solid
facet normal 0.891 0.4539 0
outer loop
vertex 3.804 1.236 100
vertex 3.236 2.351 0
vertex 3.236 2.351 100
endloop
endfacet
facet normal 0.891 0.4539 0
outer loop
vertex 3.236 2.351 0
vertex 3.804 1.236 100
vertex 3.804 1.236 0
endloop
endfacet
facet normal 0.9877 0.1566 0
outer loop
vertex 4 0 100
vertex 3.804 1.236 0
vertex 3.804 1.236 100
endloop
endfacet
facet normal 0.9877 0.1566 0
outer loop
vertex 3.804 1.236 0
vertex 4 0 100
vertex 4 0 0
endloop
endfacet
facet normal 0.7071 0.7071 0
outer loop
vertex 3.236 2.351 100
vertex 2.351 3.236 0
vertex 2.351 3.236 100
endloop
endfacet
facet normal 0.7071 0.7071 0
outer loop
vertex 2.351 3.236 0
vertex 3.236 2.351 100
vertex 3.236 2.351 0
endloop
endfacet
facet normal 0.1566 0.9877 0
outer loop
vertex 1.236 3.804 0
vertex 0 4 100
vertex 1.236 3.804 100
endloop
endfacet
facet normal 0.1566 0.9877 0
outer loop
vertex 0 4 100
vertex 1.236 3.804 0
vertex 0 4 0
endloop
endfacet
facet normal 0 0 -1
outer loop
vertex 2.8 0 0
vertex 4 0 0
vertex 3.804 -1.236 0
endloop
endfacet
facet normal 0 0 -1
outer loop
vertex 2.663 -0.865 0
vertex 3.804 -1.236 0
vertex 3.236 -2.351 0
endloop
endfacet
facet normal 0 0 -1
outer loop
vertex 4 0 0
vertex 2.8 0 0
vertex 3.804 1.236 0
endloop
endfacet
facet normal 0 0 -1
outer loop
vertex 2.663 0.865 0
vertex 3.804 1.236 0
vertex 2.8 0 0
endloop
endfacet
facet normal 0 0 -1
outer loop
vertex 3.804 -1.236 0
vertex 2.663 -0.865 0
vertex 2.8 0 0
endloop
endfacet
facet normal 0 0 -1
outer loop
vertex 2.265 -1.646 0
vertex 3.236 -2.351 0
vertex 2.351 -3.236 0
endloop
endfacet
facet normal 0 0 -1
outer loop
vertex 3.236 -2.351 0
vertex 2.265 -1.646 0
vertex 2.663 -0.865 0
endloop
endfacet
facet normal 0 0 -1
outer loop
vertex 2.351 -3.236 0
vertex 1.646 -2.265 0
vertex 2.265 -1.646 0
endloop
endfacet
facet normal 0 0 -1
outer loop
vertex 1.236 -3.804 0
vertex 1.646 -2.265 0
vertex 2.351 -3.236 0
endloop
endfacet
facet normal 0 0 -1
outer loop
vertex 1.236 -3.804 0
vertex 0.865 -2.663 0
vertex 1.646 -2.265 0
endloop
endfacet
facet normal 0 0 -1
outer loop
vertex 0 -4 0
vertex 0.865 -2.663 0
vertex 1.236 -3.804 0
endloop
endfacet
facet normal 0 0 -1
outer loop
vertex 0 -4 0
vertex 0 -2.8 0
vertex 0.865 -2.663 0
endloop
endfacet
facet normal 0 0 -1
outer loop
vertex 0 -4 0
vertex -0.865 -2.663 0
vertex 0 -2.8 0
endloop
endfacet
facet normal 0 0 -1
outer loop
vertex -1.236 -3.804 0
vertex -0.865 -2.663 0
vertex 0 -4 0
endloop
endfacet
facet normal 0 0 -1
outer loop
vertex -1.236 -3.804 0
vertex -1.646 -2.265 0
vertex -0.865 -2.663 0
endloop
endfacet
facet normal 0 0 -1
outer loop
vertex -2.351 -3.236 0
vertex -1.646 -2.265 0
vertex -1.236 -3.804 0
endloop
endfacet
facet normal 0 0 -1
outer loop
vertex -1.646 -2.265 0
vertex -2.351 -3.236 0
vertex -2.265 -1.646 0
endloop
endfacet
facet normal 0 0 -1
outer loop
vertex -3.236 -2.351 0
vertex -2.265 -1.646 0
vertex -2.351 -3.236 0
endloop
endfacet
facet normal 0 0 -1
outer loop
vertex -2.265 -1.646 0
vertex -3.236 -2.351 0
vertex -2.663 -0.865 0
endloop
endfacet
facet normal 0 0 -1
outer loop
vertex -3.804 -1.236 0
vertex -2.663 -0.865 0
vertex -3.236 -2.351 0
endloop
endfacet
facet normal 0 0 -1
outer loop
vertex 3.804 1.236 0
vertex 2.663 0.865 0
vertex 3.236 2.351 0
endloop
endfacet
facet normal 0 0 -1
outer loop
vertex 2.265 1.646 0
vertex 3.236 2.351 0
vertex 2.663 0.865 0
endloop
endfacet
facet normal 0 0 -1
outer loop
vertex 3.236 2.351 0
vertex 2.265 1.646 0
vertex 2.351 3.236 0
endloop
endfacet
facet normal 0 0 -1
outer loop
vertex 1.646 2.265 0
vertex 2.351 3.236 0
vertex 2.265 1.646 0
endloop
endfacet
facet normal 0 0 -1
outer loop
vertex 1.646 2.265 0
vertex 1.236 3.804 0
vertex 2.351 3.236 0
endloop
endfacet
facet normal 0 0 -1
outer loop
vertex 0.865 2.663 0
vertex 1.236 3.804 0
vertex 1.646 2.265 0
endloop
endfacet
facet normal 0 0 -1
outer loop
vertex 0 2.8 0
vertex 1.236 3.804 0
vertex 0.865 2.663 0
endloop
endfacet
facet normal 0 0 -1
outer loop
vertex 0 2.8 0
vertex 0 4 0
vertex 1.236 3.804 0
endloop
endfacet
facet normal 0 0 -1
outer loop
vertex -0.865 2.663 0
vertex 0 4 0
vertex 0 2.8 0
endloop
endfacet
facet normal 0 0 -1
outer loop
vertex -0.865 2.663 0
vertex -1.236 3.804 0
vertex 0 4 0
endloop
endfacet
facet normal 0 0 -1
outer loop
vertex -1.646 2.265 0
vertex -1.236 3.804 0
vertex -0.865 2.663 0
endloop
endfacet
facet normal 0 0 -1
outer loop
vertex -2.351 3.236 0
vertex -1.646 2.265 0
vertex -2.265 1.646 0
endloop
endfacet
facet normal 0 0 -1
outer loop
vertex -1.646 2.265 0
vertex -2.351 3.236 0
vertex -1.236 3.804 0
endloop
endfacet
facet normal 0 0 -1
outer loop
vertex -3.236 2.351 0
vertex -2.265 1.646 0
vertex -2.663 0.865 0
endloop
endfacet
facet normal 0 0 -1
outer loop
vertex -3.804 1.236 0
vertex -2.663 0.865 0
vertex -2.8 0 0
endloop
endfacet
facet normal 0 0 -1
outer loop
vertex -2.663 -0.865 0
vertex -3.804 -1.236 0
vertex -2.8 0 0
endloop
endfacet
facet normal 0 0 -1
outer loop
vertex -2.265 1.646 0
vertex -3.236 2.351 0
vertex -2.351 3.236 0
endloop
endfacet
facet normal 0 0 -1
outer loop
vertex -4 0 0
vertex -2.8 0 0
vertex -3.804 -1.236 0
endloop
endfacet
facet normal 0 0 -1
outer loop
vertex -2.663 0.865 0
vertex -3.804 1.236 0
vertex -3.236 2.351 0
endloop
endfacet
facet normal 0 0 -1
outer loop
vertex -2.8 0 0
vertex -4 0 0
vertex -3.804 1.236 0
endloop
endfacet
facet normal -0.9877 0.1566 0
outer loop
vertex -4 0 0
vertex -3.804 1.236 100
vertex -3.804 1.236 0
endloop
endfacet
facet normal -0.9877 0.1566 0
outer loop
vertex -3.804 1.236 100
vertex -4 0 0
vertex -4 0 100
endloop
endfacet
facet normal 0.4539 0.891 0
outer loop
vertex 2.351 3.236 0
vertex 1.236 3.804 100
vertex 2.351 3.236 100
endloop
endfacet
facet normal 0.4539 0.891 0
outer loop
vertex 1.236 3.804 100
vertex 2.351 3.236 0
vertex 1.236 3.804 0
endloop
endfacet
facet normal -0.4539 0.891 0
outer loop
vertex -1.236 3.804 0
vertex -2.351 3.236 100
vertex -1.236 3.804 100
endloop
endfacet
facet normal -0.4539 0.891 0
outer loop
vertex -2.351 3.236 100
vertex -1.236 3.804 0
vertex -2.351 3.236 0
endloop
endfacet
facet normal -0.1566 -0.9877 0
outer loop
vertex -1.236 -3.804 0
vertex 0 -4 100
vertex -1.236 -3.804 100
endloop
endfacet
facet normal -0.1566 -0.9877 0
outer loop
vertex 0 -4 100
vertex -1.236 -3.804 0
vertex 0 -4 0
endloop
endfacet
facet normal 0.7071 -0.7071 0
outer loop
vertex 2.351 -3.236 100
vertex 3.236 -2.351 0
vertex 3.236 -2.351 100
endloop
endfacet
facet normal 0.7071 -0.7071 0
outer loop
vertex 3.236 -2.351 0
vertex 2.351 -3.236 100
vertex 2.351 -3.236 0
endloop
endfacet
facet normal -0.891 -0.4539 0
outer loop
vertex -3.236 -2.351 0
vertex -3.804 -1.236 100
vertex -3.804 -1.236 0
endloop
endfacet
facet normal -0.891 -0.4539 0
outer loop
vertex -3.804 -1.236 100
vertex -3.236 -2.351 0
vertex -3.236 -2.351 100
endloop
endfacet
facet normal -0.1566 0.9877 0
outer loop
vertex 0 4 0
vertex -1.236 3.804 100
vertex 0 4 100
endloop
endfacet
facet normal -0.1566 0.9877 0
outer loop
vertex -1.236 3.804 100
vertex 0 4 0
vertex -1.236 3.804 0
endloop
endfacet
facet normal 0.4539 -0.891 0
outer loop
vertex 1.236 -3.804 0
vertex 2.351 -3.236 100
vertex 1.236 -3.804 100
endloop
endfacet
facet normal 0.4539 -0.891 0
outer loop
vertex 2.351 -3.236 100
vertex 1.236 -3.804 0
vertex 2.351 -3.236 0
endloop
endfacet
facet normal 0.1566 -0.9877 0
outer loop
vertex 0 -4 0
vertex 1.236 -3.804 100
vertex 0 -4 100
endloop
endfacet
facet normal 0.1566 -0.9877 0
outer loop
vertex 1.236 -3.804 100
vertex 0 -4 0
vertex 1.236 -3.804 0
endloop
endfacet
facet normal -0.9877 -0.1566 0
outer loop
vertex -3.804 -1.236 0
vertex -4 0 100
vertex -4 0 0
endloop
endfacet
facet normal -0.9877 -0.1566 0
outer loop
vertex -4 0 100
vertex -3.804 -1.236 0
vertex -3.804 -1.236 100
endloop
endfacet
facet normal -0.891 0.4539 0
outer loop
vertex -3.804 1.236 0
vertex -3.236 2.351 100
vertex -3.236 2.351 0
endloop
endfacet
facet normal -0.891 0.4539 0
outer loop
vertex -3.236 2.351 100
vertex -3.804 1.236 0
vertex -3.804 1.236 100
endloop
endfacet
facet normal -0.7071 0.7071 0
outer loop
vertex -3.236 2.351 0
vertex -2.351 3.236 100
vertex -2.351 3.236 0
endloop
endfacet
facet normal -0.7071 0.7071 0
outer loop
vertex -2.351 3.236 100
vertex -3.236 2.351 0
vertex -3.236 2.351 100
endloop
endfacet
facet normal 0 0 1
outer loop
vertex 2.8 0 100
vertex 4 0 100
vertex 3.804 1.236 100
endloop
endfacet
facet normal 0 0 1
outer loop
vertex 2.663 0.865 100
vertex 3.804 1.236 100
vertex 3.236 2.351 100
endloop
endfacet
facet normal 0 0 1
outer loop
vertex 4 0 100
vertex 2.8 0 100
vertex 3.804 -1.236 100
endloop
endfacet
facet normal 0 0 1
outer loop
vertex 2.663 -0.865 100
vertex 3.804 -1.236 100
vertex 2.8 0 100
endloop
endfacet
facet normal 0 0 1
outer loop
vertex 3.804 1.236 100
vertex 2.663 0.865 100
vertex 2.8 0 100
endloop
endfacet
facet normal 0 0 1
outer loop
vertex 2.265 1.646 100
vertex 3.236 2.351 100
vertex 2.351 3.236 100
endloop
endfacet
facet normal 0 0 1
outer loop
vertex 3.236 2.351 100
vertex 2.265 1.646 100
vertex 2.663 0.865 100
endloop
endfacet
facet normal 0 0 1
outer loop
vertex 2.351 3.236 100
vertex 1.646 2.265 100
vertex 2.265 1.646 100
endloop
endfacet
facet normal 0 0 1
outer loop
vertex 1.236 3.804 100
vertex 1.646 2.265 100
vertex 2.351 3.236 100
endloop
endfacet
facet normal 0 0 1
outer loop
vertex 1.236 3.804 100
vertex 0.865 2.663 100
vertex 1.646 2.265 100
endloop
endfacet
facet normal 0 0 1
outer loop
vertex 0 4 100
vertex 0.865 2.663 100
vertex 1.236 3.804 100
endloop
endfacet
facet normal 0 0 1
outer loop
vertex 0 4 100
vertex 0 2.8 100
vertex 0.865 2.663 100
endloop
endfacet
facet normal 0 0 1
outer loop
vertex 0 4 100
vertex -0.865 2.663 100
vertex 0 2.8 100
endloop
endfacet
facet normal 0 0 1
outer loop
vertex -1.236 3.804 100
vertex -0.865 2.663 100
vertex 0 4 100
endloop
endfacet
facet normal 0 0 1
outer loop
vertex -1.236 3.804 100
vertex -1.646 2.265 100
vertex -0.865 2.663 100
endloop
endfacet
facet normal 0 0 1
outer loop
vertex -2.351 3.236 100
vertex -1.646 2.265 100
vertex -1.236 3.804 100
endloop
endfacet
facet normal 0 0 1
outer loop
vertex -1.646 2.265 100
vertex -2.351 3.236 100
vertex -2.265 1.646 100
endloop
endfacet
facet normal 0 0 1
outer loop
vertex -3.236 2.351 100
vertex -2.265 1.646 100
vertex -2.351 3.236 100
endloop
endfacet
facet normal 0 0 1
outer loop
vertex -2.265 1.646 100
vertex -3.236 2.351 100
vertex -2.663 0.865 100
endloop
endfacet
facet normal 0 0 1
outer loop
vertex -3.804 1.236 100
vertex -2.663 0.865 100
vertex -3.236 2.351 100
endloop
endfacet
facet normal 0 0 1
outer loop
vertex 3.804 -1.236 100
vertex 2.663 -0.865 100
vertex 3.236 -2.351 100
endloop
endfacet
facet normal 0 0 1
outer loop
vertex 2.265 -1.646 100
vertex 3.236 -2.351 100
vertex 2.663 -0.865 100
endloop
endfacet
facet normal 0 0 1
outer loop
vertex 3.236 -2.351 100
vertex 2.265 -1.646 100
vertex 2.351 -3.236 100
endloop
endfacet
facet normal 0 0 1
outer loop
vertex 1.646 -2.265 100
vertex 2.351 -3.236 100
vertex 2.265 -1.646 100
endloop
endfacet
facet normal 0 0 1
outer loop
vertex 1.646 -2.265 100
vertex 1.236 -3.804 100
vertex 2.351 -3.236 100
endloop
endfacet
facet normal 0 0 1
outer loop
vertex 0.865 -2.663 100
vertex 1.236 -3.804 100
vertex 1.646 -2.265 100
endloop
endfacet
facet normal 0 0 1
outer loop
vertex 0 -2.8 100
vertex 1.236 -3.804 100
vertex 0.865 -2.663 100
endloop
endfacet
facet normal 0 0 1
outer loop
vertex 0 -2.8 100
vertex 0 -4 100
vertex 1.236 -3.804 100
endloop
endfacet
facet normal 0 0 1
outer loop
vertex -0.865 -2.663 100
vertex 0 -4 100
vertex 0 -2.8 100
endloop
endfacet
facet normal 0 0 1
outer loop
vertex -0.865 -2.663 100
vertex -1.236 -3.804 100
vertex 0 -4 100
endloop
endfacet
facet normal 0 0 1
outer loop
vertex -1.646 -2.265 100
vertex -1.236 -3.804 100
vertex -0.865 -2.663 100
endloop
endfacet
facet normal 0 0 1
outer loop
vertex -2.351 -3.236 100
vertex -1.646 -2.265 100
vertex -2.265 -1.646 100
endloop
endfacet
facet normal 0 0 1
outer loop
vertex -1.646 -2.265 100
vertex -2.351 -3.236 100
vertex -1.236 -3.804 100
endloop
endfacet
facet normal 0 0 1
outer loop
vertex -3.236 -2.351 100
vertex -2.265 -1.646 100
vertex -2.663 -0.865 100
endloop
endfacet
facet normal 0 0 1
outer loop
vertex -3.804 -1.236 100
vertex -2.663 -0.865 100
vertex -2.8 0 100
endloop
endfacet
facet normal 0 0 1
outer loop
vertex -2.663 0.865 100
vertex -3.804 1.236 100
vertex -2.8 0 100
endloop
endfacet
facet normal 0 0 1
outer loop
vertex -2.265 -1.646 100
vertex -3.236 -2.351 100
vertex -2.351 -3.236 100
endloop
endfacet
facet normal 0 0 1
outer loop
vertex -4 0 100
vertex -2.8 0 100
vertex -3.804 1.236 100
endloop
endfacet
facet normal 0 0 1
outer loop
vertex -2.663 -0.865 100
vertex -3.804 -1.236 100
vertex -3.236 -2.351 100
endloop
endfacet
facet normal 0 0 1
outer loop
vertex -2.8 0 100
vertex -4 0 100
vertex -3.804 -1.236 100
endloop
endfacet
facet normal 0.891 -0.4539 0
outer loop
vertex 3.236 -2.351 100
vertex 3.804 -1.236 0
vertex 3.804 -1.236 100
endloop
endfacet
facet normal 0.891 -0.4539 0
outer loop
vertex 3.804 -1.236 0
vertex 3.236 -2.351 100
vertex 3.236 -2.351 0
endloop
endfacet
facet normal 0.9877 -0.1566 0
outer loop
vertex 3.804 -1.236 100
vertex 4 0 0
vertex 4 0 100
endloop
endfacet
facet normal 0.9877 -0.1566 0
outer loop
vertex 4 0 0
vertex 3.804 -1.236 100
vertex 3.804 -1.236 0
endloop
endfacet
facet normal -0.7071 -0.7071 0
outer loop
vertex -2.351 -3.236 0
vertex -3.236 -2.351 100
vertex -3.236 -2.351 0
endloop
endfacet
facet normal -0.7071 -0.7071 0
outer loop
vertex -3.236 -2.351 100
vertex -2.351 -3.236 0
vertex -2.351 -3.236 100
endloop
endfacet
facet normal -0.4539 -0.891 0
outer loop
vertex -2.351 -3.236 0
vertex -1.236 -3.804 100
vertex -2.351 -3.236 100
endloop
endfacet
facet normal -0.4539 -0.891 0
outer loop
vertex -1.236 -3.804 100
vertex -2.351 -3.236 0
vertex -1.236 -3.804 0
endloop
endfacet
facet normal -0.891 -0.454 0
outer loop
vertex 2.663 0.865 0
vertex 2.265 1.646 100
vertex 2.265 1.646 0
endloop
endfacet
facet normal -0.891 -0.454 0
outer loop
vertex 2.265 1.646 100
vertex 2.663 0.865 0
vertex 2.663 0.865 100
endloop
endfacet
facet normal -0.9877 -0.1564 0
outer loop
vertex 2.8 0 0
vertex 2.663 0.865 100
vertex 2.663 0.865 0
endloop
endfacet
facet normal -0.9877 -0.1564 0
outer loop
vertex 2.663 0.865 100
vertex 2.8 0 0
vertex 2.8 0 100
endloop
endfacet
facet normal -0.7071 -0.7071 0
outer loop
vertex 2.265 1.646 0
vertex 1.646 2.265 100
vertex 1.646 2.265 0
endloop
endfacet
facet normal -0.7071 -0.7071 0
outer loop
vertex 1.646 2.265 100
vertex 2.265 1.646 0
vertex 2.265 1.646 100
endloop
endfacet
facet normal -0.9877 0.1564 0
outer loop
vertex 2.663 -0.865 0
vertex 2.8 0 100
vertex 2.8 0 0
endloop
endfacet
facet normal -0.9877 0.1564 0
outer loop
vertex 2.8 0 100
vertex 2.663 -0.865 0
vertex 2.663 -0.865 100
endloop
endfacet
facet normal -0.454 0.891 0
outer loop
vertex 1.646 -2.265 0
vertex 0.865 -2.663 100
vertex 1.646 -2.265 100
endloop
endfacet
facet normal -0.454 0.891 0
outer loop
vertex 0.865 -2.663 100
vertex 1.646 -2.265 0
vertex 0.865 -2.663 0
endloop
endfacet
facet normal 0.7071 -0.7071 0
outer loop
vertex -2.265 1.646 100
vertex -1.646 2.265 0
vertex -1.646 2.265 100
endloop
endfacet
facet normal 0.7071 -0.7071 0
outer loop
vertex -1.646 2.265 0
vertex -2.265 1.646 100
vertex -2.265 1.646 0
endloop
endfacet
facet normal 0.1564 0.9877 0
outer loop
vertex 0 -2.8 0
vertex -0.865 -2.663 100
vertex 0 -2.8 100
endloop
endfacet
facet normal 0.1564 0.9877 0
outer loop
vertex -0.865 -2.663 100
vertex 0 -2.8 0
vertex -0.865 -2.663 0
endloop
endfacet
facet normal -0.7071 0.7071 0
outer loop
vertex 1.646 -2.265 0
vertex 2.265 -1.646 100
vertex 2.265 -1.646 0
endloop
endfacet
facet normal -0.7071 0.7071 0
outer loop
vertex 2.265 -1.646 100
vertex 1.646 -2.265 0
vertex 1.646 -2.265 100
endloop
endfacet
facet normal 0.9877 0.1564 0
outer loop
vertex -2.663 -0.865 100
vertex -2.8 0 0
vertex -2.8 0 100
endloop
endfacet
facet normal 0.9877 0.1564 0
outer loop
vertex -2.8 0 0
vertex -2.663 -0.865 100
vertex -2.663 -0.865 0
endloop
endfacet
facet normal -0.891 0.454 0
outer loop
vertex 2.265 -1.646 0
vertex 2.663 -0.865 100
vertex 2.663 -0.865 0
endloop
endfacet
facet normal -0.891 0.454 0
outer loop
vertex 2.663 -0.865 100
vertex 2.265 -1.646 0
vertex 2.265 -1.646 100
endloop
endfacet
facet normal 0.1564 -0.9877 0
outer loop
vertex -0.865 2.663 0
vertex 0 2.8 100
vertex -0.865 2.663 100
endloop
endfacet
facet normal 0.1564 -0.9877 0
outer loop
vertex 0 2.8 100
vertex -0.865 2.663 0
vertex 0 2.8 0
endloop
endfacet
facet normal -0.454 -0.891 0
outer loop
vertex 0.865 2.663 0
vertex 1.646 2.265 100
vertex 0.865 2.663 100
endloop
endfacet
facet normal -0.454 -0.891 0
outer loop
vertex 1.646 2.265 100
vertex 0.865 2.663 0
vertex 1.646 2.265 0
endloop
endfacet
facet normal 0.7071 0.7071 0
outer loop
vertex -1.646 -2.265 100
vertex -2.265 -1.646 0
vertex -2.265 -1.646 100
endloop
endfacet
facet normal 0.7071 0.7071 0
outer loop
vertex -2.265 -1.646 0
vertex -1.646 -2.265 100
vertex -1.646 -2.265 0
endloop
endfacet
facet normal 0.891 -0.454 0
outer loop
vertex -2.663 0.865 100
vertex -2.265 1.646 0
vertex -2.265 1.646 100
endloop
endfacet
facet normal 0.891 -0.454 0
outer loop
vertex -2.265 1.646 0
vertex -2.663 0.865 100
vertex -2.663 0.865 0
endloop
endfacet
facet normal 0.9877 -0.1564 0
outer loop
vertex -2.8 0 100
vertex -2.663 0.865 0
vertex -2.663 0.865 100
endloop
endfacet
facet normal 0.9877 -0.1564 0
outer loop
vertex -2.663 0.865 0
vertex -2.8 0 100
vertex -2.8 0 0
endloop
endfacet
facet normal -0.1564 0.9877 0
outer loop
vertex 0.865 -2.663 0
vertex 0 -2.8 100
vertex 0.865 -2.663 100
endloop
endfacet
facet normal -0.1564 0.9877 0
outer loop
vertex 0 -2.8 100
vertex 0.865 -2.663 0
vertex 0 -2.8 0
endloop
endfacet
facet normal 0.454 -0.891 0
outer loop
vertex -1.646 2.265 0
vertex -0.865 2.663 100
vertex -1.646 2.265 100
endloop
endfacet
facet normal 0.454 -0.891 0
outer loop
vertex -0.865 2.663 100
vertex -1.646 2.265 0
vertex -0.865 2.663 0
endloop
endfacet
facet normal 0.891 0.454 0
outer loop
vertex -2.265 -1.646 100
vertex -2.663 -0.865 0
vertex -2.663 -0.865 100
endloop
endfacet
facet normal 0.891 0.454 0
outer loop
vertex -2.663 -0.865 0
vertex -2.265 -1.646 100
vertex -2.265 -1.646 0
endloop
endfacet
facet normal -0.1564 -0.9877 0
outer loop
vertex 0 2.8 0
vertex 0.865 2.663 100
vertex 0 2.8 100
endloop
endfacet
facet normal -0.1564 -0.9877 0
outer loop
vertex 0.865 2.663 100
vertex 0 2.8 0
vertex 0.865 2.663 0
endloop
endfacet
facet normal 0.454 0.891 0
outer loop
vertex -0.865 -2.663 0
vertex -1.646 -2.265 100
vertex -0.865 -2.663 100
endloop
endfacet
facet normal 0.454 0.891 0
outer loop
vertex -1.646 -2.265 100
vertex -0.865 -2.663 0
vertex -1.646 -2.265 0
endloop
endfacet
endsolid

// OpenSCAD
$fn = 20;

vule = 0.3;
//vnejsi prumer
vp = 4;
//vnitrni prumer
vp1 = 2.5;
vyska= 100;

difference(){
    cylinder(r=vp,h=vyska);
    translate([0,0,-0.5])
    cylinder(r=vp1 + vule,h=vyska + 1);
}
